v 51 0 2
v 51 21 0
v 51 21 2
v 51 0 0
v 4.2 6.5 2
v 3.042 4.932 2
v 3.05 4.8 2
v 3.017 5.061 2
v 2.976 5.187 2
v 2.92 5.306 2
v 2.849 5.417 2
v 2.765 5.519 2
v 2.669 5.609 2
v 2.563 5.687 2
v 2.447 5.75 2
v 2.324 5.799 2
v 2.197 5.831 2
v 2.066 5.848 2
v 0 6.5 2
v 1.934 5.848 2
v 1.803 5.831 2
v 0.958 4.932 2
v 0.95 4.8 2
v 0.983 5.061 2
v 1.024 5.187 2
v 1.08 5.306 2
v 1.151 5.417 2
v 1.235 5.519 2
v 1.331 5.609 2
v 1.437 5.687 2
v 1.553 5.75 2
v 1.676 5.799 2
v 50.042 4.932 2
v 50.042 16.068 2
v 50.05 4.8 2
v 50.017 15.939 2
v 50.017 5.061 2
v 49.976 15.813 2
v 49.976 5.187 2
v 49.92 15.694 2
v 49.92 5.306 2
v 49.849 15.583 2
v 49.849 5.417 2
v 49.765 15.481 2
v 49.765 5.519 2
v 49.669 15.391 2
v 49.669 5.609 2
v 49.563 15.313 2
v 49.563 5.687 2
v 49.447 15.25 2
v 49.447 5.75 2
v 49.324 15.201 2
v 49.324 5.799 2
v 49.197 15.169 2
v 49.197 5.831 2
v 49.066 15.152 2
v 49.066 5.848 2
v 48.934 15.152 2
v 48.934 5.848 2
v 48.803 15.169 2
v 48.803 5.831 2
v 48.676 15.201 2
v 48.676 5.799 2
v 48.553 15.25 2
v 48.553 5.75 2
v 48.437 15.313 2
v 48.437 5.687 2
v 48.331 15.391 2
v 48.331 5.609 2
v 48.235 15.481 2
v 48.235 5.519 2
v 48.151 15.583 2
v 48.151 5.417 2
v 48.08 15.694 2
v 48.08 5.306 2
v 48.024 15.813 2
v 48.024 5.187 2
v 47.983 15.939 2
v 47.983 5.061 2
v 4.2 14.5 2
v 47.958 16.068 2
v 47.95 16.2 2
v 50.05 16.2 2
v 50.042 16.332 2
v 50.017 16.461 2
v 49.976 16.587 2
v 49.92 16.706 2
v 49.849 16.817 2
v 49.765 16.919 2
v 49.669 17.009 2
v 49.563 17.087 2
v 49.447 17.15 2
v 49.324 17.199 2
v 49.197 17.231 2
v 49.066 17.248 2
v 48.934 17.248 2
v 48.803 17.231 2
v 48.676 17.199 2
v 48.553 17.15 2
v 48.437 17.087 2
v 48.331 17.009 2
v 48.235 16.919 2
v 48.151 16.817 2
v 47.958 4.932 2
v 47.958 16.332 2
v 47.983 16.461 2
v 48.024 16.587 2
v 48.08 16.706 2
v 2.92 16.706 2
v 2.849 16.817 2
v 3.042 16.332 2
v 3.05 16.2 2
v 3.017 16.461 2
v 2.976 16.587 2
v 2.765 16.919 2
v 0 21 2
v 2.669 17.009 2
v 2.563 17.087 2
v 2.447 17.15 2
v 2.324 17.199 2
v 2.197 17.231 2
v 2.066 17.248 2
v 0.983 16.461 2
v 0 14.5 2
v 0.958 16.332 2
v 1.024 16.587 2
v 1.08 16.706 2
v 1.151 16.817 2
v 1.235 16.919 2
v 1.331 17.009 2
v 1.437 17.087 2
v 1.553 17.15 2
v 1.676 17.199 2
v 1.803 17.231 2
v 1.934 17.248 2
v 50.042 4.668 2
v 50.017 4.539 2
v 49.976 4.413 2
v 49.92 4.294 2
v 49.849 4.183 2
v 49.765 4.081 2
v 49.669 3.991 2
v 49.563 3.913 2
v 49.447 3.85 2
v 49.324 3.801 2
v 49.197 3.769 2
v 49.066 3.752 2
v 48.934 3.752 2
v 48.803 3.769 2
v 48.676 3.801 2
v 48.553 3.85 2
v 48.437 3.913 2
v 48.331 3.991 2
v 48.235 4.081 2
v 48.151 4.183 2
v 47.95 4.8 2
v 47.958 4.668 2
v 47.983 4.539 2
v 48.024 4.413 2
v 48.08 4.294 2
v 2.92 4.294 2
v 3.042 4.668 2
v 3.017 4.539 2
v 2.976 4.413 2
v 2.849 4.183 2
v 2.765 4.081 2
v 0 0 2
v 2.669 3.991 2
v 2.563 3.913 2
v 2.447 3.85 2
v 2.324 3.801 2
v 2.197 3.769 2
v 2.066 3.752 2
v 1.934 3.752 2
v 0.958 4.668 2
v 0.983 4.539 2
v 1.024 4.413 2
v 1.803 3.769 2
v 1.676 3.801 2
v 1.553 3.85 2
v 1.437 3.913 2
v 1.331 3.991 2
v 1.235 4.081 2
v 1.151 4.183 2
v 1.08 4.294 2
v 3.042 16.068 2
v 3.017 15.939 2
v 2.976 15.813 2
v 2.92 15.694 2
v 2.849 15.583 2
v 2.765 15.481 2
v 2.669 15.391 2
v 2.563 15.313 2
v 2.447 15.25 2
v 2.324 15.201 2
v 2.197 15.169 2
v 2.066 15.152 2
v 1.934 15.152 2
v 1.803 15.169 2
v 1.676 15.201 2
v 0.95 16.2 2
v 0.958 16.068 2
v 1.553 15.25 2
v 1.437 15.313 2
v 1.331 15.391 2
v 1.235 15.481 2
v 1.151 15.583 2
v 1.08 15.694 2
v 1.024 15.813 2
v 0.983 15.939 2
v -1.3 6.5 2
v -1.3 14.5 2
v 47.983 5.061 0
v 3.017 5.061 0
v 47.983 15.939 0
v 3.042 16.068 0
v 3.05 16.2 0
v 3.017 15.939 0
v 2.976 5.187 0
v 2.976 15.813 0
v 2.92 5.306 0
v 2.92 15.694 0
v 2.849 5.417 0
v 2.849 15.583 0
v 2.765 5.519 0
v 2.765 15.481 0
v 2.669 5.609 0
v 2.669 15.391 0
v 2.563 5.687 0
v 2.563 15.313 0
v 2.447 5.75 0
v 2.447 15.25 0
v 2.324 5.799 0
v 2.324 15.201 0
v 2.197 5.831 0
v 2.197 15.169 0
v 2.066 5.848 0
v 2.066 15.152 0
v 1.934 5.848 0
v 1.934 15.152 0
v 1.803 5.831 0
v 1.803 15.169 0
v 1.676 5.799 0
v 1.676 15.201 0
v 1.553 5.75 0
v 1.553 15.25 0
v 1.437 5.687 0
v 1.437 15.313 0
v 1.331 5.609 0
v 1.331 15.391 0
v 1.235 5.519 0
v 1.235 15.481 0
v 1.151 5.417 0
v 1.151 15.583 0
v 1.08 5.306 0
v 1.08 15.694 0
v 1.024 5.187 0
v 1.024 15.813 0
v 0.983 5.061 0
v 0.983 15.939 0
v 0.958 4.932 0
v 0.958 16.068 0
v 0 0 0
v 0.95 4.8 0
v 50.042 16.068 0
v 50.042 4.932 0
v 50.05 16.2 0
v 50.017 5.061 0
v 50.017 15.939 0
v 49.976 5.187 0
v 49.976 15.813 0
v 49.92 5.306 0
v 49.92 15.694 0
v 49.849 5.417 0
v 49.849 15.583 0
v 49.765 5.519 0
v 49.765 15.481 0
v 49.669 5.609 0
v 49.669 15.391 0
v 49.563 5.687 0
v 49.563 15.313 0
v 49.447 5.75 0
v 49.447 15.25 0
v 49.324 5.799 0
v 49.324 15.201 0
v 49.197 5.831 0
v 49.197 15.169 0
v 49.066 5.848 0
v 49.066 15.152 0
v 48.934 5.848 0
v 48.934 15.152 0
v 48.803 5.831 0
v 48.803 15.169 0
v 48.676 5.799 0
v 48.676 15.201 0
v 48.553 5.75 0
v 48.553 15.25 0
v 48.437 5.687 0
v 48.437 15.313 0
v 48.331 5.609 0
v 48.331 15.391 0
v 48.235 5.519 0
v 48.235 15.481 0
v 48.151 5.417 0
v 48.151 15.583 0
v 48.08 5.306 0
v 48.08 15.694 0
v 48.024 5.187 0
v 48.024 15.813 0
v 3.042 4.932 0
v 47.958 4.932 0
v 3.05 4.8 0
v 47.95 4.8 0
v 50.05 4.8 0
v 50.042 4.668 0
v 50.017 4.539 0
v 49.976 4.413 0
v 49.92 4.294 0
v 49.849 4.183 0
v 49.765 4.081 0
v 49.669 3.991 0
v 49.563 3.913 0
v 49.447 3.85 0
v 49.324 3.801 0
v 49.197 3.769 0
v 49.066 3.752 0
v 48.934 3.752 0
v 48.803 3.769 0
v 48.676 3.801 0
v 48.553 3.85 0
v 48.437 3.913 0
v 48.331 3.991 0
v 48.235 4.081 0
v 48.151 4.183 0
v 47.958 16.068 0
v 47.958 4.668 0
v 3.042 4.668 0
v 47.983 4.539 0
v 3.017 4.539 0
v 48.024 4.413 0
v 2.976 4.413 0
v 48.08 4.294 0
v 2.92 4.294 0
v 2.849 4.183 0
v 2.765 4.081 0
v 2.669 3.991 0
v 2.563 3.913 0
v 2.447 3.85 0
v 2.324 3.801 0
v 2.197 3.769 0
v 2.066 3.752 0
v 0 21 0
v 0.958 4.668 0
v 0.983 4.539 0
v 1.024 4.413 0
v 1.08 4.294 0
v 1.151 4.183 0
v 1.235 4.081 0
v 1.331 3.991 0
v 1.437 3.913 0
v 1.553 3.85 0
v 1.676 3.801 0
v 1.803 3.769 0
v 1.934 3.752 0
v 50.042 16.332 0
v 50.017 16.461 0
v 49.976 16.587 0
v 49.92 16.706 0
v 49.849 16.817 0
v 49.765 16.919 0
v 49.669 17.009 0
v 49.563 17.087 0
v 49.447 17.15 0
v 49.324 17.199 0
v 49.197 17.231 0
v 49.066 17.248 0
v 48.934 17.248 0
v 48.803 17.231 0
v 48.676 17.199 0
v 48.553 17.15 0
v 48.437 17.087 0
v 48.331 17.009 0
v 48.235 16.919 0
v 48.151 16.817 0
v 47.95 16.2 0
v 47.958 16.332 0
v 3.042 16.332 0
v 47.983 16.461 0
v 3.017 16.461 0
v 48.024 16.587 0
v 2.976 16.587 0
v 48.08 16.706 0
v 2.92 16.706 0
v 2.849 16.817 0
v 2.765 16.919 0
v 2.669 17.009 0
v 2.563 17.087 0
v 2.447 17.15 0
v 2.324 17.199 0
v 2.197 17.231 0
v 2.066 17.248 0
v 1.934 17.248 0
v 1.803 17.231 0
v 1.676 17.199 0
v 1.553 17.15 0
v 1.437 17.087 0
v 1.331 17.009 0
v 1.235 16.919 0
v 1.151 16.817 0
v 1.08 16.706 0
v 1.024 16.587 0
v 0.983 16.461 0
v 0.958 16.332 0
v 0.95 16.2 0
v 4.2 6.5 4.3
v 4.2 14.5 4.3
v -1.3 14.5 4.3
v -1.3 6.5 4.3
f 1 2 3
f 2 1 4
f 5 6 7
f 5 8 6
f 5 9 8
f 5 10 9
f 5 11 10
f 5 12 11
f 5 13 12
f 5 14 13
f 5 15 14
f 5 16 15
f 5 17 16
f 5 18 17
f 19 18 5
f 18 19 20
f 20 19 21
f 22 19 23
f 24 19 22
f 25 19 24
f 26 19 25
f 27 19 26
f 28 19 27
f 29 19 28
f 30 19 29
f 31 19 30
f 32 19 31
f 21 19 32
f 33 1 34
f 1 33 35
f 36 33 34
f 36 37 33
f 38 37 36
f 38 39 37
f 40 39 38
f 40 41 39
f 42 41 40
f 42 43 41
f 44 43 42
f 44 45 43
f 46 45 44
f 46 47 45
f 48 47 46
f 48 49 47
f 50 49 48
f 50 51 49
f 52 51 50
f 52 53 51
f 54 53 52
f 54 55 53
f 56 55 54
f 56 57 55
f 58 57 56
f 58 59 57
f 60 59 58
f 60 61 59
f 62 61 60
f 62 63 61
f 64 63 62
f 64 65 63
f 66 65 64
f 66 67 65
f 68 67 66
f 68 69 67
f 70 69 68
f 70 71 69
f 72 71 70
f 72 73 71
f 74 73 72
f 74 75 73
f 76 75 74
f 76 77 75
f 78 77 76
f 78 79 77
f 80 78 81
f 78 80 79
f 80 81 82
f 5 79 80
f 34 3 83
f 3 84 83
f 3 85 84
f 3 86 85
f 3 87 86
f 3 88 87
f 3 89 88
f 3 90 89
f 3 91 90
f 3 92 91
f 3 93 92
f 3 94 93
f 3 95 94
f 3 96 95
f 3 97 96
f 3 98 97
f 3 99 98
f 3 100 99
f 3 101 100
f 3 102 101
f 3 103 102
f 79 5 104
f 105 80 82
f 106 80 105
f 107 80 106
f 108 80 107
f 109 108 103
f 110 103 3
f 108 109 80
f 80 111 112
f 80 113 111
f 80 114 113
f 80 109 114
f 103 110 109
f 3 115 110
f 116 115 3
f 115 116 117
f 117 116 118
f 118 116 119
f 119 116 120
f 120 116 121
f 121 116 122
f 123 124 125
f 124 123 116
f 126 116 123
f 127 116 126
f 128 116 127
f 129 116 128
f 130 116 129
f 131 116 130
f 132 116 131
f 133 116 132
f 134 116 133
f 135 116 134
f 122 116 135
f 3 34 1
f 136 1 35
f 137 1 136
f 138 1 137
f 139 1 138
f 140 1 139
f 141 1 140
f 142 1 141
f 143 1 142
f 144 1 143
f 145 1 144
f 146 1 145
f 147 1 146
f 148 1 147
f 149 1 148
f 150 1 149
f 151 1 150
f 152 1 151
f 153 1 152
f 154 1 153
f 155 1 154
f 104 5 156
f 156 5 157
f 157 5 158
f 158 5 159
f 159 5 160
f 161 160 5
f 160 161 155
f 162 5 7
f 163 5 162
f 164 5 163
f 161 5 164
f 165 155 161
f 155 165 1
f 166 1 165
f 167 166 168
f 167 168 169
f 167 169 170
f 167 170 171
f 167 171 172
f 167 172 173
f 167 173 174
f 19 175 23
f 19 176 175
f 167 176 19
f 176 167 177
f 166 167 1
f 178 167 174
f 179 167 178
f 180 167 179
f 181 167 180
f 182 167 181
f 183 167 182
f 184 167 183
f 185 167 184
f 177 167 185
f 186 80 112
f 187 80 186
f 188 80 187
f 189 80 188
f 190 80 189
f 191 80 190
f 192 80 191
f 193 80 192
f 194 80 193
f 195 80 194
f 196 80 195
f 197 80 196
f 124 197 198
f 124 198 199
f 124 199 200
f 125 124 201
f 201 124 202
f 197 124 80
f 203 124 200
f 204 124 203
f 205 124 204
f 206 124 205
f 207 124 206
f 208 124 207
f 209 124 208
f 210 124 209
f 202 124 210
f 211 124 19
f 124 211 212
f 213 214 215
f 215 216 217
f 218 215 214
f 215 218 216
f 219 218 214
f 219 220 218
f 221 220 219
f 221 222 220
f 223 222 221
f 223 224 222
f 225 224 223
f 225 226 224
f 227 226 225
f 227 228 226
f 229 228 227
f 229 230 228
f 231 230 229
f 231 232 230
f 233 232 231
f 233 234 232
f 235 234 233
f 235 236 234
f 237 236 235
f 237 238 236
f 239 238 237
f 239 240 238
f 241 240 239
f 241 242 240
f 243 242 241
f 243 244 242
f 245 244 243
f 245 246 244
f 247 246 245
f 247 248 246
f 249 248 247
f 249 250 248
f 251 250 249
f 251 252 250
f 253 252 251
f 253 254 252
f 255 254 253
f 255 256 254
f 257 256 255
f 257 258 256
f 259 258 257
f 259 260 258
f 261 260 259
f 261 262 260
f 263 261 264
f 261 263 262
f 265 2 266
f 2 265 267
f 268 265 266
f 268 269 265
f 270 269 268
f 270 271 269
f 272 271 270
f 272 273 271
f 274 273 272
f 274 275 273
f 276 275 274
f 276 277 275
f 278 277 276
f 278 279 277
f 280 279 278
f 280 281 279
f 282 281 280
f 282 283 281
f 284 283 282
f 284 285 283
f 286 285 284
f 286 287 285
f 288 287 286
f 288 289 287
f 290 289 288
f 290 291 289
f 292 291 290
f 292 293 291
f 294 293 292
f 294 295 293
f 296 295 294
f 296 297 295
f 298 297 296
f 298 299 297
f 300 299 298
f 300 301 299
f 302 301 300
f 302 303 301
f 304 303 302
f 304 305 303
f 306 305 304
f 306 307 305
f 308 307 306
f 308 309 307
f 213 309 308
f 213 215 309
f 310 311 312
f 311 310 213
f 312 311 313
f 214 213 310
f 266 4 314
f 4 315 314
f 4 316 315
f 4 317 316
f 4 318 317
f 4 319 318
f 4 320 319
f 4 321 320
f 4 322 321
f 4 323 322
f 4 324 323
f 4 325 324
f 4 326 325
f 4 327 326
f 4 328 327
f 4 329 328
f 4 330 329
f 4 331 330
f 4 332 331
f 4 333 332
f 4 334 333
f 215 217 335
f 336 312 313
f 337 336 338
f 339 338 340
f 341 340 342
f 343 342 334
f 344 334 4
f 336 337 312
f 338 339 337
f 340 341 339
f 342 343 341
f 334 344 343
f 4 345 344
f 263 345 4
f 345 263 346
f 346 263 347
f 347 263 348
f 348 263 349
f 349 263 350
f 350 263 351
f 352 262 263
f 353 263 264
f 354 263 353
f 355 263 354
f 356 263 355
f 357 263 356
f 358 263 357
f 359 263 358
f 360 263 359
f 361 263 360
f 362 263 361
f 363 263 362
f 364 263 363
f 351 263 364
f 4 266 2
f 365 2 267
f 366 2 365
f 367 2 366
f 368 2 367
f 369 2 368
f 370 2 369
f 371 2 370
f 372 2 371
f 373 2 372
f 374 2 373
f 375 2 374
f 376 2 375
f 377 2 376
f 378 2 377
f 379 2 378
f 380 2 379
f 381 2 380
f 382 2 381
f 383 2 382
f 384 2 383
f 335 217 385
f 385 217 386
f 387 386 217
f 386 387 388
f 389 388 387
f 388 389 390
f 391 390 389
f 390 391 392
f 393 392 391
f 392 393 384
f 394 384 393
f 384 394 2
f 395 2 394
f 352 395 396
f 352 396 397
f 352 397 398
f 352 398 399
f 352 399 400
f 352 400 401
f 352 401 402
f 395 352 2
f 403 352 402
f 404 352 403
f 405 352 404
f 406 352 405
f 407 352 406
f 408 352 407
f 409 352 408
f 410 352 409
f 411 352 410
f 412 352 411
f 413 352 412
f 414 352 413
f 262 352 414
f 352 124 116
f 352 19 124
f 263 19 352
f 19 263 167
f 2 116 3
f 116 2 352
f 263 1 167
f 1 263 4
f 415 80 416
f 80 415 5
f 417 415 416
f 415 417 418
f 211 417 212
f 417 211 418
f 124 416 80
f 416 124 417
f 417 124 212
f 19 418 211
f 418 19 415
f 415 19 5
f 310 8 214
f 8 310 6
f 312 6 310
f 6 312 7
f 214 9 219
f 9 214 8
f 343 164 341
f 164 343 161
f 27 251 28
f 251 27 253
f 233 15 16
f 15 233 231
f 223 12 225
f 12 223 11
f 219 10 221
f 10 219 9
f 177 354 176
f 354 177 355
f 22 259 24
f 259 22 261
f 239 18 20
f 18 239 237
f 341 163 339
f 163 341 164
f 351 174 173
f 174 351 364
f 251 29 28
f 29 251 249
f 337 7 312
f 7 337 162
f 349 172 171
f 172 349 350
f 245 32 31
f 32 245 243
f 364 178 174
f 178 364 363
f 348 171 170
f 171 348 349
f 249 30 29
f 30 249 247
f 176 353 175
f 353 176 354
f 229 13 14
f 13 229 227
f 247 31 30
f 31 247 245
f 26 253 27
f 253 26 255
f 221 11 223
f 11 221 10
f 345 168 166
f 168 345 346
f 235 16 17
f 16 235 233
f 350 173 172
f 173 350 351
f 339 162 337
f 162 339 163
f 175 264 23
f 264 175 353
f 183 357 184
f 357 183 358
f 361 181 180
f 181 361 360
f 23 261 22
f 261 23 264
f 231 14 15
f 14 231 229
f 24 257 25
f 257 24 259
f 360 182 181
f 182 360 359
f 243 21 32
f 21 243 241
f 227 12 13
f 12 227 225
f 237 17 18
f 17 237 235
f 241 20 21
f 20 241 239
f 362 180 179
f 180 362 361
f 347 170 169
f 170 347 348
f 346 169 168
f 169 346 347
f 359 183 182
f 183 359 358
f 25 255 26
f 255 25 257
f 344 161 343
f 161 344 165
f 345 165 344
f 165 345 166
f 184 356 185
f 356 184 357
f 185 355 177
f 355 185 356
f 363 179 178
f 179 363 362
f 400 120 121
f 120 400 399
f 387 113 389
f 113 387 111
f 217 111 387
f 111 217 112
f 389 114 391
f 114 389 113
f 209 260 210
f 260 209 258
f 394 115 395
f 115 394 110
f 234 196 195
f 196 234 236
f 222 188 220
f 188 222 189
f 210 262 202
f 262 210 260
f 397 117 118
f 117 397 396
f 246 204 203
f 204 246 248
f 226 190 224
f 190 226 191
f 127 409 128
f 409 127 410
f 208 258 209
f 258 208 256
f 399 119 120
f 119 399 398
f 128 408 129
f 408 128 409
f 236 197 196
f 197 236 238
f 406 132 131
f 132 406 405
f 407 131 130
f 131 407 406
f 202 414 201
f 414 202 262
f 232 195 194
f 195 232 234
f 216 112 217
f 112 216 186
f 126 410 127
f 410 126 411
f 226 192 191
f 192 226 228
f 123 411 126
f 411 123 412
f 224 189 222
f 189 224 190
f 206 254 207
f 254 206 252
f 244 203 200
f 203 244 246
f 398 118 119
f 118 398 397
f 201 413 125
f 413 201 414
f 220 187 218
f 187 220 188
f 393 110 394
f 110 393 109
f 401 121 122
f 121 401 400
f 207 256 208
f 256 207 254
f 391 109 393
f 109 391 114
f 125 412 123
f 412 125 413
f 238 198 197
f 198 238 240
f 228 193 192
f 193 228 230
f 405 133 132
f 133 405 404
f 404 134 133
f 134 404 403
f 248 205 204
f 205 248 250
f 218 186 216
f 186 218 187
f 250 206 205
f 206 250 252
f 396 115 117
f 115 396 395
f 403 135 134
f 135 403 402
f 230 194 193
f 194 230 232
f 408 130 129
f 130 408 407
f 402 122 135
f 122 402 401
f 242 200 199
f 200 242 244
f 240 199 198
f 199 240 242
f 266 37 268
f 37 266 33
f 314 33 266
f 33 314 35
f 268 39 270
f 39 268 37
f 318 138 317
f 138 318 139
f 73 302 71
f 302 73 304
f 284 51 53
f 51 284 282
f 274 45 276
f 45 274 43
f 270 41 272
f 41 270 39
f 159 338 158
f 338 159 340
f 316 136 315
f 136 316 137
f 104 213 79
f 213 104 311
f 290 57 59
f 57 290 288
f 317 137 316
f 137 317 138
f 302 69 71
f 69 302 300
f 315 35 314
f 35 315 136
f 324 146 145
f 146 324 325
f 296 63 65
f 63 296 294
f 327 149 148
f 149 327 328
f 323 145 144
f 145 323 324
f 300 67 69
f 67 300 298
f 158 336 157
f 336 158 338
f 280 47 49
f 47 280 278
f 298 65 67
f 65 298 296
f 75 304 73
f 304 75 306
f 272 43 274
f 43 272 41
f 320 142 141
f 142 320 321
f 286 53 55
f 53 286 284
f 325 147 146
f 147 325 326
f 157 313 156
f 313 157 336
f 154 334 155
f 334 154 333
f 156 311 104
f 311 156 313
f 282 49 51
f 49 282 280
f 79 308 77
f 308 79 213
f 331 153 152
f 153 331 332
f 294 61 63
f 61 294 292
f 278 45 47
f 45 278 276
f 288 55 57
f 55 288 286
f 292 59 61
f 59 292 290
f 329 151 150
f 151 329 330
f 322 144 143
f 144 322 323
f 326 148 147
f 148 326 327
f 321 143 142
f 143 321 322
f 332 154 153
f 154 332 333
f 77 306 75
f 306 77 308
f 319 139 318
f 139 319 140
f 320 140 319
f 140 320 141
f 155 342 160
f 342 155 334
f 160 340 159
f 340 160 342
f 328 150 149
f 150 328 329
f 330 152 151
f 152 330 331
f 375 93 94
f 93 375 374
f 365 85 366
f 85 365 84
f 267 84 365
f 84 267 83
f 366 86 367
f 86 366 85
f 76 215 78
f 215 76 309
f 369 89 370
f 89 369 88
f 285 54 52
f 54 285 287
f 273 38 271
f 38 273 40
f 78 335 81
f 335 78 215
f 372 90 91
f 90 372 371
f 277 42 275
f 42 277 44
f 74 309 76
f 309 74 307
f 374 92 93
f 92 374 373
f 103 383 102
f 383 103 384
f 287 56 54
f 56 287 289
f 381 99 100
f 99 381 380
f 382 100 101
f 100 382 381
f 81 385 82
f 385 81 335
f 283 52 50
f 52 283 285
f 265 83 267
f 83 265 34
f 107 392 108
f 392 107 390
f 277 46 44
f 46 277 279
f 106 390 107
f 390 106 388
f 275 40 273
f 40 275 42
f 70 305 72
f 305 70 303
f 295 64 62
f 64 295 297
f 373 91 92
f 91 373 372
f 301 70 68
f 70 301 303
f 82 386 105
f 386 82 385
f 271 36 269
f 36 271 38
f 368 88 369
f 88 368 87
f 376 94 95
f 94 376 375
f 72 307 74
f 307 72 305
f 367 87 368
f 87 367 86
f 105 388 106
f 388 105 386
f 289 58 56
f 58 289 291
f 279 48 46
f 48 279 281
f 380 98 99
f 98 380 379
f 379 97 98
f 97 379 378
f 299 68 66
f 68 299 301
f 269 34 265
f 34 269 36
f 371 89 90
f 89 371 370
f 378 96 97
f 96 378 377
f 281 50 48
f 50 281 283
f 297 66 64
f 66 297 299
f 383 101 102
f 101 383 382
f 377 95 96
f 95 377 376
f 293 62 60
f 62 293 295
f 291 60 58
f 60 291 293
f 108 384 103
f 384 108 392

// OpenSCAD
// file: pico_config.scad
pico_width = 51;
pico_height=21;
pico_thickness=2;
pico_screw_from_width=2;
pico_screw_from_height=4.8;
margin=0.1;
pico_screw_hole=2.1;
usb_height=8;
usb_protrude=1.3;
usb_width=5.5;
usb_thickness=2.3;

pico_holes=[
    [pico_screw_from_width, pico_screw_from_height],
    [pico_screw_from_width, pico_height-pico_screw_from_height],
    [pico_width-pico_screw_from_width,pico_screw_from_height],
    [pico_width-pico_screw_from_width,pico_height-pico_screw_from_height]
];
// main file
include <pico_config.scad>;

module pico_holes_block(diameter, margin, extra_up,thickness) {
    $fn=50;
    for(i=[0:3])
        translate([pico_holes[i][0],pico_holes[i][1],-margin/2]) 
            cylinder(h=thickness+margin+extra_up, d=diameter);
}


module pico() {
    difference() {
        union() {
            color("green") cube([pico_width,pico_height,pico_thickness]);
            color("grey") translate([-usb_protrude,(pico_height-usb_height)/2,pico_thickness]) cube([usb_width, usb_height, usb_thickness]);
        }
        pico_holes_block(pico_screw_hole, margin,1,pico_thickness);
    }
}

pico();
